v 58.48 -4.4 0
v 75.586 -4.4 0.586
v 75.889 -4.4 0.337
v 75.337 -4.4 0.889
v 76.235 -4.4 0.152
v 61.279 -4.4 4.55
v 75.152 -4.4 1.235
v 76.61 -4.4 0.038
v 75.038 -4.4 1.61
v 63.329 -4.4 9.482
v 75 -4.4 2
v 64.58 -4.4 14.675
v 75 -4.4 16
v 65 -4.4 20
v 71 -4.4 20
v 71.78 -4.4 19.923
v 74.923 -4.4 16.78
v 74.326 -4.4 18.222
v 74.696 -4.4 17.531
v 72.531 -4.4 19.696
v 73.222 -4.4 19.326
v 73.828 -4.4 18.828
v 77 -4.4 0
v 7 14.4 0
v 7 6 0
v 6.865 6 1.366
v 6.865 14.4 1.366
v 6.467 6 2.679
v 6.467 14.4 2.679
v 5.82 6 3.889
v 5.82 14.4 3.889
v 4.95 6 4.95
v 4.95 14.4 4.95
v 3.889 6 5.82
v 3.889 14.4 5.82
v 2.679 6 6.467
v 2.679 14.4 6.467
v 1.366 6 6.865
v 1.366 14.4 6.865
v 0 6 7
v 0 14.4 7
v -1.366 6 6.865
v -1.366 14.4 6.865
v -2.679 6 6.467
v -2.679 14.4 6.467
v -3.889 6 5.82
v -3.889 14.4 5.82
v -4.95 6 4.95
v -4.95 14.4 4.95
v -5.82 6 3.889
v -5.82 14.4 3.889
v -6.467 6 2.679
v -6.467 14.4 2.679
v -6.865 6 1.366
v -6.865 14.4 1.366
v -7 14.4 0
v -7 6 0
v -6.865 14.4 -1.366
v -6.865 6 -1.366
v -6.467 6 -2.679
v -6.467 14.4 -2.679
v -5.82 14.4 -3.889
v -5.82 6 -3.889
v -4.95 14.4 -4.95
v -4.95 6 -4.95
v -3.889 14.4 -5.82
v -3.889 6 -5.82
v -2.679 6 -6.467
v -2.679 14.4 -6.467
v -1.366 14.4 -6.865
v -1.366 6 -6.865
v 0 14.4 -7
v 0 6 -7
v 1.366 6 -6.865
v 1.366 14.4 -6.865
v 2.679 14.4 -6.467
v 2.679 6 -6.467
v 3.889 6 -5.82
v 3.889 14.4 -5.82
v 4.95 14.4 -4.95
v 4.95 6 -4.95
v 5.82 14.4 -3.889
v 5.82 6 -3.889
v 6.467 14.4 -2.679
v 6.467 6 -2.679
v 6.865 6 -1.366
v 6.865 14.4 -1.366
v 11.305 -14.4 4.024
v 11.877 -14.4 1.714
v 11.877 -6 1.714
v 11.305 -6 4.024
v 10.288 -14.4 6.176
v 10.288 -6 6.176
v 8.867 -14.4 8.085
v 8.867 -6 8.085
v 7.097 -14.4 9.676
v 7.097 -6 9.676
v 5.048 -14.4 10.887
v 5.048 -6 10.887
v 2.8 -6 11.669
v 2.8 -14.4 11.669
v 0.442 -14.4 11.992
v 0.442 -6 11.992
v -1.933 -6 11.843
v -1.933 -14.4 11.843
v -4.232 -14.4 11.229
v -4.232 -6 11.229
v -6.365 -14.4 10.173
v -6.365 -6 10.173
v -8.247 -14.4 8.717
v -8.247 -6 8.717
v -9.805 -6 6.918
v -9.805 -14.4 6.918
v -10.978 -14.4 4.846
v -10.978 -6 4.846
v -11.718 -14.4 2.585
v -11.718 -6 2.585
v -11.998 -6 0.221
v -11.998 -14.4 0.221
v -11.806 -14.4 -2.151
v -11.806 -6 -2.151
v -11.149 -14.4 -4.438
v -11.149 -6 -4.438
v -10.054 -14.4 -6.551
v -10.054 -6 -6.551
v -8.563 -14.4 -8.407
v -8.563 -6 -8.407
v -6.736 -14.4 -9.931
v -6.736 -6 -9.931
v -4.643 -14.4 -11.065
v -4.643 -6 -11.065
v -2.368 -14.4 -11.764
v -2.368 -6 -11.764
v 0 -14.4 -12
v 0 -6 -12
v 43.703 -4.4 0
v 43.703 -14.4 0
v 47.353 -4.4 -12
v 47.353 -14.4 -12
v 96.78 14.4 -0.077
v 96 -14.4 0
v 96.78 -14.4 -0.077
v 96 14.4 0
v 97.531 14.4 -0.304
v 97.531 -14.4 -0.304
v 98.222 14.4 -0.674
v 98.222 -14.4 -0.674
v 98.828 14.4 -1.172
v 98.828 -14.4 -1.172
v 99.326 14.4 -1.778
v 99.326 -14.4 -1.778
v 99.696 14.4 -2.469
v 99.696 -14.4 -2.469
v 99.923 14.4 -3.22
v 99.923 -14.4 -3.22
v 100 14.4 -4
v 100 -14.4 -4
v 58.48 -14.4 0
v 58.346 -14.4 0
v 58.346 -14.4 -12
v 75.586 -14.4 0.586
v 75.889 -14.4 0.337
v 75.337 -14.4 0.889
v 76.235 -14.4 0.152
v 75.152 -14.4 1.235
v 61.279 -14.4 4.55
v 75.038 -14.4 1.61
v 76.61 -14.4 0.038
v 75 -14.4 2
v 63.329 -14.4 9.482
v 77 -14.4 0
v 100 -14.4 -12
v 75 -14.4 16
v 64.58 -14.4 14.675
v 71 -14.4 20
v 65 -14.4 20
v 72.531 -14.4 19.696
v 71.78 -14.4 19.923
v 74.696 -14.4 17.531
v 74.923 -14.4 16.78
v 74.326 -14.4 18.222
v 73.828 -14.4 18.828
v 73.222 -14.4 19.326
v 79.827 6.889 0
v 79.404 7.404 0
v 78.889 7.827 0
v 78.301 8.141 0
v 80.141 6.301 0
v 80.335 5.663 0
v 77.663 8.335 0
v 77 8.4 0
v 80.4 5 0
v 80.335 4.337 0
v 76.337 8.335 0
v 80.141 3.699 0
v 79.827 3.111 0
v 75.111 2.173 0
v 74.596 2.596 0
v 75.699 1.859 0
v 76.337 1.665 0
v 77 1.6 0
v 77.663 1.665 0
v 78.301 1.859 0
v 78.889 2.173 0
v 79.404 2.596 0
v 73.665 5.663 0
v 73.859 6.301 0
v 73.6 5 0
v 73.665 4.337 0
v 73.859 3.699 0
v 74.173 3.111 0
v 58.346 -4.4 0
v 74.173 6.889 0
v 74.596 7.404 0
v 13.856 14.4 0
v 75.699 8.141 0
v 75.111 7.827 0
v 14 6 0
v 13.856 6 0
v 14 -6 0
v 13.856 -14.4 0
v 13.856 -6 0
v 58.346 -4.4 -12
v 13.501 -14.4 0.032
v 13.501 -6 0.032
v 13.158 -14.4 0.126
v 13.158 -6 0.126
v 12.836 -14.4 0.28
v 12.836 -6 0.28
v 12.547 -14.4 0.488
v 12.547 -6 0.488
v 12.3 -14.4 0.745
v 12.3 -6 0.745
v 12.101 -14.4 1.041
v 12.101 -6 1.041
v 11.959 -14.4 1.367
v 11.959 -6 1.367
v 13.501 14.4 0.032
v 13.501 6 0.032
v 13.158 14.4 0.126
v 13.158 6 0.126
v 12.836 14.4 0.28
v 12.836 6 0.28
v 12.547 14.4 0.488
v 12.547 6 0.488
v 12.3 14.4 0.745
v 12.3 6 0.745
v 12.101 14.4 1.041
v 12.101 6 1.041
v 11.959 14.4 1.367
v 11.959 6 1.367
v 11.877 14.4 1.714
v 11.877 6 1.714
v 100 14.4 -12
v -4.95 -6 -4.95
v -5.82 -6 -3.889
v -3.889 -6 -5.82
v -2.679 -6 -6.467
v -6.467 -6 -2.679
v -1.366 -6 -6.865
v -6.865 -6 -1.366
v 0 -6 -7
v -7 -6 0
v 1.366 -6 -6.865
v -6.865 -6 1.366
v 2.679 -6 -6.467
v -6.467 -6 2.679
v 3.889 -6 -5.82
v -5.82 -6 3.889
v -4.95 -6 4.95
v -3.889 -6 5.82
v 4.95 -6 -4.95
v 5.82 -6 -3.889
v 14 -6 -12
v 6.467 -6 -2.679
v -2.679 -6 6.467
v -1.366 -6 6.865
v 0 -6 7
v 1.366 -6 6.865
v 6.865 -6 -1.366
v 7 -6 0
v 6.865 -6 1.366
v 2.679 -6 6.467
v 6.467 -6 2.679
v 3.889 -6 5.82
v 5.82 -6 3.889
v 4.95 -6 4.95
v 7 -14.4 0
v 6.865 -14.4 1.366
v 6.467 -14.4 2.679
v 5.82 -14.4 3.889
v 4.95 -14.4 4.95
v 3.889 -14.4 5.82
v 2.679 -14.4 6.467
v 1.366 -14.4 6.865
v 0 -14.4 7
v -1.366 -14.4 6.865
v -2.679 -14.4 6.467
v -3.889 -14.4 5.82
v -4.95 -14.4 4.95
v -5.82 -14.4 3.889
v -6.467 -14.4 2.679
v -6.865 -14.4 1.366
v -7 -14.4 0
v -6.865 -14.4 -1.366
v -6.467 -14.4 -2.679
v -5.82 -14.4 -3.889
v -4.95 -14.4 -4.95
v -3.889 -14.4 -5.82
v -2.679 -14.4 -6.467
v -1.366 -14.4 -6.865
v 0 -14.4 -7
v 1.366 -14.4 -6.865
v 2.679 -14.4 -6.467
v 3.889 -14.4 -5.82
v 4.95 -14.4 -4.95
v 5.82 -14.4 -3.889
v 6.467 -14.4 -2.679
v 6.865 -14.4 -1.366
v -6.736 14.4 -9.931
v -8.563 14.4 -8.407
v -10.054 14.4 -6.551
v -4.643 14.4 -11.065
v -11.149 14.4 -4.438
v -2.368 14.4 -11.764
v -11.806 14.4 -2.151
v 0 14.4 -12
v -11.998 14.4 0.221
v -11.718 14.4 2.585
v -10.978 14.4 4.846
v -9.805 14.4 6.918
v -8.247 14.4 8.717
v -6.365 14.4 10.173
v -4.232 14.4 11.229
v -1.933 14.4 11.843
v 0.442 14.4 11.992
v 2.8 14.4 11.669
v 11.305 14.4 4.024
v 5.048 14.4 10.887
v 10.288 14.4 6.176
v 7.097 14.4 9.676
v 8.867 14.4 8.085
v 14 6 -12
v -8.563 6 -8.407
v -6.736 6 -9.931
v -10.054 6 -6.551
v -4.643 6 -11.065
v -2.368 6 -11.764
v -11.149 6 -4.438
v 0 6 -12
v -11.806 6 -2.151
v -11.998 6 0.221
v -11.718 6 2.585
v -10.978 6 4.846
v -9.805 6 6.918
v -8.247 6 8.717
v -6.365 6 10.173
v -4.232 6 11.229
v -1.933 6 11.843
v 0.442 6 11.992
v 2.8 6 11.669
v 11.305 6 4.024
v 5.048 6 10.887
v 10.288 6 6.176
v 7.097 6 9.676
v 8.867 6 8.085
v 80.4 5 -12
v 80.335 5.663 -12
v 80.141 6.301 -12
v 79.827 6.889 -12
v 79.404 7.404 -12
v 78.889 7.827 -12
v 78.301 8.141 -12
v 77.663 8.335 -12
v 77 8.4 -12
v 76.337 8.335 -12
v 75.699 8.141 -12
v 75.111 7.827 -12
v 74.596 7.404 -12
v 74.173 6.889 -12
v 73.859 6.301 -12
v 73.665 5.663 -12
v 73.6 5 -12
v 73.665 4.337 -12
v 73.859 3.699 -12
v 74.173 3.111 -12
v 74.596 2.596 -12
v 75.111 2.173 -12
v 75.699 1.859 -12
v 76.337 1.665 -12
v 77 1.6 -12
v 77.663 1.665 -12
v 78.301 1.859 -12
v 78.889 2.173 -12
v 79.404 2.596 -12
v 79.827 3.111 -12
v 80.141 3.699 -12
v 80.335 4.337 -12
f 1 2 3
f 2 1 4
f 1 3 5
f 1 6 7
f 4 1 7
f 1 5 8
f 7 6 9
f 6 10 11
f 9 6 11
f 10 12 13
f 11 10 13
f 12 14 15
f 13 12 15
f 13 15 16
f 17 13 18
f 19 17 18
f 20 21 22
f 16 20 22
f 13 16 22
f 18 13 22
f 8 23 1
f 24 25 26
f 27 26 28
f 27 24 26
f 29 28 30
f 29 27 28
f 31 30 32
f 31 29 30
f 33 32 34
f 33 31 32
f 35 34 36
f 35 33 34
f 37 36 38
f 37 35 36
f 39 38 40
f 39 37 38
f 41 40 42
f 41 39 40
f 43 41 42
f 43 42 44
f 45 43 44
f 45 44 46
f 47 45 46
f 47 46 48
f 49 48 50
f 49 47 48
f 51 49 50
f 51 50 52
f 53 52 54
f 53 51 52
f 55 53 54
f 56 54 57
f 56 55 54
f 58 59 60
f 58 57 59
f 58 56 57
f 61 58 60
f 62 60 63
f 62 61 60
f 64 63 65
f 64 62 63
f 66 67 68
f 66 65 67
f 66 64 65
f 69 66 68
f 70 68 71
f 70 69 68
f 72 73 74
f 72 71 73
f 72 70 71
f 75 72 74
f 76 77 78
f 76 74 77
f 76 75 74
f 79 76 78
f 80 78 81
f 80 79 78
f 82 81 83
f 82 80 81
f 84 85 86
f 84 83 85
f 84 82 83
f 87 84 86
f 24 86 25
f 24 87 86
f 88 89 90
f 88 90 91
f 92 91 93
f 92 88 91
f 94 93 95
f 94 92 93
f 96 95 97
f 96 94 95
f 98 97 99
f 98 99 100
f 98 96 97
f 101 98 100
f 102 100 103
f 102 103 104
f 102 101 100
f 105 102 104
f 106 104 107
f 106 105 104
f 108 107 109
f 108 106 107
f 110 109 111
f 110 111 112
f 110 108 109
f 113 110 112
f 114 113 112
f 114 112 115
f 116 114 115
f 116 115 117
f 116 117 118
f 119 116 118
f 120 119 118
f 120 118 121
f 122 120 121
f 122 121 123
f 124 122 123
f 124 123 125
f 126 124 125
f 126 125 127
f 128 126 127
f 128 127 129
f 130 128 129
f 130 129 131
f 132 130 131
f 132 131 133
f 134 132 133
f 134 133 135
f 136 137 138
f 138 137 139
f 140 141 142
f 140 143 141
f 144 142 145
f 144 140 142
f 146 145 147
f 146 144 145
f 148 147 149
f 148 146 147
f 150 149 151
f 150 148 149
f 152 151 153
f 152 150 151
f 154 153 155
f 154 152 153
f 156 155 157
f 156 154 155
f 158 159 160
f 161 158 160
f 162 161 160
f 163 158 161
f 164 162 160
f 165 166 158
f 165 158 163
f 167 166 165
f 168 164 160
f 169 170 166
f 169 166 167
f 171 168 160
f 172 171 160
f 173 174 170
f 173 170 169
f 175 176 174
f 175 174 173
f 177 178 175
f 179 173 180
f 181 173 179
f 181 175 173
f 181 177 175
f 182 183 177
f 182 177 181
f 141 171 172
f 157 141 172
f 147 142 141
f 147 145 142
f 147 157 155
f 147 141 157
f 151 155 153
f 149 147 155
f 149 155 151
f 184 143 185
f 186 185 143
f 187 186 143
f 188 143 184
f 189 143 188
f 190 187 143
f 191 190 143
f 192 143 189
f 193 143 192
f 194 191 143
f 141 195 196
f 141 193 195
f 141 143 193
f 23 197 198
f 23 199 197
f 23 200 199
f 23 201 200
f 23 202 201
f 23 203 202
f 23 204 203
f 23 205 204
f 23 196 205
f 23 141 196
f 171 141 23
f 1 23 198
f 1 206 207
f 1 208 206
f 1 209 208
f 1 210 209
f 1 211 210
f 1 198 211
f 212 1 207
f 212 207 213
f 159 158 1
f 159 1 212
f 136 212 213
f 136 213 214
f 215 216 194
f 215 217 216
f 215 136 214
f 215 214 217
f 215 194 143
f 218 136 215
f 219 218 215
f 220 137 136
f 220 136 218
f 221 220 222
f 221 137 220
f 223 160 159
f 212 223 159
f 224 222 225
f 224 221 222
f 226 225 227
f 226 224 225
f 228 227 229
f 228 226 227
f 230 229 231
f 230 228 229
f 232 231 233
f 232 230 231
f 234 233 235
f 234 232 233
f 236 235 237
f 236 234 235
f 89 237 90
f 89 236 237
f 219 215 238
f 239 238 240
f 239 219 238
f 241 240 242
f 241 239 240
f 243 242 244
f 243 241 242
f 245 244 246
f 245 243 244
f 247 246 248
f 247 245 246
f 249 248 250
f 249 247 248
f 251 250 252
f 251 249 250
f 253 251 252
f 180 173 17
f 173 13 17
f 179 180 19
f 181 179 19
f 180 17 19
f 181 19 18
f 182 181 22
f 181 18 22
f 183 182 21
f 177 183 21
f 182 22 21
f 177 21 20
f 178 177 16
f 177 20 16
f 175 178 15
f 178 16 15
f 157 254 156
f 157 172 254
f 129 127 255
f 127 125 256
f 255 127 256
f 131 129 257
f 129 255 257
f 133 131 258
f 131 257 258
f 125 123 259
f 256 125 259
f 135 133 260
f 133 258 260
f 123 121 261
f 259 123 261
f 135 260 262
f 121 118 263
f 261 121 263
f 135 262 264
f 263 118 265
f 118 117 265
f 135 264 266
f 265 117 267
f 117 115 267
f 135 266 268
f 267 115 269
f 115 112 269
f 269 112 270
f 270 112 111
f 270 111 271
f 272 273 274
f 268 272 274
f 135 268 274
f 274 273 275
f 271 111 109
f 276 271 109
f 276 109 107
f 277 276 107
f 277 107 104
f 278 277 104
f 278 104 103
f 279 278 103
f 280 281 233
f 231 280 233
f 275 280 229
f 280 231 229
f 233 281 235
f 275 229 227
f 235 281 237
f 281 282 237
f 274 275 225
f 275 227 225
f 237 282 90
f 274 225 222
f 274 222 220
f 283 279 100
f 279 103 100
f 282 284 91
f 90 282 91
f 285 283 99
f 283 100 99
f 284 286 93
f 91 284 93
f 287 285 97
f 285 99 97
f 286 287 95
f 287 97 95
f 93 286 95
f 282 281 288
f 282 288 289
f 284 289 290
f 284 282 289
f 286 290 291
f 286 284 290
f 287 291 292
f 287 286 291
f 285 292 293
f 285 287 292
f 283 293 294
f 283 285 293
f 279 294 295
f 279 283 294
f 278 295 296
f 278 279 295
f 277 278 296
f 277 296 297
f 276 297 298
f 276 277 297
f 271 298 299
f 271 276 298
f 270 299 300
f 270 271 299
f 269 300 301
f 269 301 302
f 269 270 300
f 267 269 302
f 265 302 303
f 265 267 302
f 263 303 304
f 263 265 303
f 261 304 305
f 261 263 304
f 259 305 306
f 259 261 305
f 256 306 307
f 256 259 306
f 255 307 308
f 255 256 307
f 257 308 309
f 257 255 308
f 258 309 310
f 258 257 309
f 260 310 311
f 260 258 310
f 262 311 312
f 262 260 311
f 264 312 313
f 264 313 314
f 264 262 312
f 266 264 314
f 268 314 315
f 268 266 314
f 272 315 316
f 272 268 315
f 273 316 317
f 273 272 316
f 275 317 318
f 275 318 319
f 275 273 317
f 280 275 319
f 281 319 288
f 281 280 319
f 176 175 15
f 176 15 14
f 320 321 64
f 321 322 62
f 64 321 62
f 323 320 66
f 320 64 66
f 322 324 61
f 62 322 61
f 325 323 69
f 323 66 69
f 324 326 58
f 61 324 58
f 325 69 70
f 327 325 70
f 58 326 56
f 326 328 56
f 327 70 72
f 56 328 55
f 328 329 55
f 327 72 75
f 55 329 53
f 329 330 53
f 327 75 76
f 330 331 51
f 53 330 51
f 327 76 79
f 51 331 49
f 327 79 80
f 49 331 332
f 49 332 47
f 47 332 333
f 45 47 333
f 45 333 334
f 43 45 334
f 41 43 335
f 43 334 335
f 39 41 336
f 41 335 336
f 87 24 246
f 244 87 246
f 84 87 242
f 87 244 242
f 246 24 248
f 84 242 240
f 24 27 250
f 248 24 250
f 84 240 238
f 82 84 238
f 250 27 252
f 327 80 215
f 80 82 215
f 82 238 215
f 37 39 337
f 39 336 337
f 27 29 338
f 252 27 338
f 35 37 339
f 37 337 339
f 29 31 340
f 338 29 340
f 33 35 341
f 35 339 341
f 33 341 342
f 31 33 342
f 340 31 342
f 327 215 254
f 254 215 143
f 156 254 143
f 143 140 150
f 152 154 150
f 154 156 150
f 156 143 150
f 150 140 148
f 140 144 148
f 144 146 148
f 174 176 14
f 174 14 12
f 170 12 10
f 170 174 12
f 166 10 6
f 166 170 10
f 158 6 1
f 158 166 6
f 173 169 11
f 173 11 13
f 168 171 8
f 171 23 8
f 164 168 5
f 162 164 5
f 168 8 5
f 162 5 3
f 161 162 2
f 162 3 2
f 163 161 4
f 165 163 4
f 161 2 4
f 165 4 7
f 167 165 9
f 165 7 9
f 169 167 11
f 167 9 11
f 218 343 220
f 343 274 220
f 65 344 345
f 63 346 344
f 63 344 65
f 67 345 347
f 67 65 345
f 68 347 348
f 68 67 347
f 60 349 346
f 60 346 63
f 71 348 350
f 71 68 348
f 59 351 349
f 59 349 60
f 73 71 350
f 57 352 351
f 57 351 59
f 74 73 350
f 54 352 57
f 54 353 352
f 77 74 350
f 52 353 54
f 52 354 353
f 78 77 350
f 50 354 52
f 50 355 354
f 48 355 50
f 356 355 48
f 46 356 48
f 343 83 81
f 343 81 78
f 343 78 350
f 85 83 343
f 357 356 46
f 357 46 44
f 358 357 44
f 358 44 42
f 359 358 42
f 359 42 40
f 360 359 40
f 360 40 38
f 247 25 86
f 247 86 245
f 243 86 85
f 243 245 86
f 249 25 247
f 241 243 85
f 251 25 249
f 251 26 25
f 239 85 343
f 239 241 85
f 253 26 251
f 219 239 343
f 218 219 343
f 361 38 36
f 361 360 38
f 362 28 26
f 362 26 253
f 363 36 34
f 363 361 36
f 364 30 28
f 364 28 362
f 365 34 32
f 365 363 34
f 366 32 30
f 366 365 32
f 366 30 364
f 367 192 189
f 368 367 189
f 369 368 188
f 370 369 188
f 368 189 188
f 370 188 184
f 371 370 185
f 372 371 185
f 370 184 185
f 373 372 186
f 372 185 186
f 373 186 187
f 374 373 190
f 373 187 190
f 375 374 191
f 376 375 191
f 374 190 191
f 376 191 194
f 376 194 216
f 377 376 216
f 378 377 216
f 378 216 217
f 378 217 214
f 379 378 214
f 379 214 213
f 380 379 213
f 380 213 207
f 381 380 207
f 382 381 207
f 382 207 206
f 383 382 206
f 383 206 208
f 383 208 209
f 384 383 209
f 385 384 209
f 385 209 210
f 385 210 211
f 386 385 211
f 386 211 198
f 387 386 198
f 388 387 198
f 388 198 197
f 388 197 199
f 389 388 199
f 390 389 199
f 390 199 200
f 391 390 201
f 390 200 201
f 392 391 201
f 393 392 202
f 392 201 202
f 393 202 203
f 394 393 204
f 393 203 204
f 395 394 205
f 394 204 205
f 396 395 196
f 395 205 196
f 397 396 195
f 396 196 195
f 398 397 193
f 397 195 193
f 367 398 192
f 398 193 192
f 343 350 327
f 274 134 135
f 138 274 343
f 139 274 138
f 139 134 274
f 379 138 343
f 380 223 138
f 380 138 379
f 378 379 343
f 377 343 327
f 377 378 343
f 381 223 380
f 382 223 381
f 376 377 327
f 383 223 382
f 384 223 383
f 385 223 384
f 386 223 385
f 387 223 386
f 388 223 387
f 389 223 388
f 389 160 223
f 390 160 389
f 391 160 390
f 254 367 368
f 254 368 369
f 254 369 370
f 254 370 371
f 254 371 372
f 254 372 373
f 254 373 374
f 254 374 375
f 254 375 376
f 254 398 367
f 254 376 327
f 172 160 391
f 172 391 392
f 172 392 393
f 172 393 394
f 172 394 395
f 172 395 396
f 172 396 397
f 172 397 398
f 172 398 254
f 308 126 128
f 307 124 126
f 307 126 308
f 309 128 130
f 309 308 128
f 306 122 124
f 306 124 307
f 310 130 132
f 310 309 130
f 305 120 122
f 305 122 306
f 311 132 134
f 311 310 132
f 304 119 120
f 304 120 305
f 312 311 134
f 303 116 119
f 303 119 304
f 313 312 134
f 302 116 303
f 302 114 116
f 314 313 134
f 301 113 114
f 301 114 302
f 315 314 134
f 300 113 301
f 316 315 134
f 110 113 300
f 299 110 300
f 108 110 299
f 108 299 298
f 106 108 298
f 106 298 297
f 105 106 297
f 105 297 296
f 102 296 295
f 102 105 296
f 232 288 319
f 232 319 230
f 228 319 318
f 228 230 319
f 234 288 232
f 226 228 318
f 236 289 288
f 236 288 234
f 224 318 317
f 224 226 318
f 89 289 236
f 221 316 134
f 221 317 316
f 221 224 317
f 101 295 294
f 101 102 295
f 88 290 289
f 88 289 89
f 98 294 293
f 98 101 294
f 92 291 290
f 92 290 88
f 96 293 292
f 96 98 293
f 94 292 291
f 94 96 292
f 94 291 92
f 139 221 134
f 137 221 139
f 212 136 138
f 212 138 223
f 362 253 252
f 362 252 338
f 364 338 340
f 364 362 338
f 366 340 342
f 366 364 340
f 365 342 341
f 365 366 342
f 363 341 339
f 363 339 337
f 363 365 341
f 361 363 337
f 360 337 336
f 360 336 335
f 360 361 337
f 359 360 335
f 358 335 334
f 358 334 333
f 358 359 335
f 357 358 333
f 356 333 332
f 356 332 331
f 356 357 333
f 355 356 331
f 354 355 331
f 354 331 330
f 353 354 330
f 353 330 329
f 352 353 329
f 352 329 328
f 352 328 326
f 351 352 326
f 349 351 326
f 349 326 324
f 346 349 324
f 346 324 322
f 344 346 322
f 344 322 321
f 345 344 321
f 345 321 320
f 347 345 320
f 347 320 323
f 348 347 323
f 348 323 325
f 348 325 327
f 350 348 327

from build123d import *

# Parameters (mm, degrees)
F0_R      = 7
F1_DEPTH  = 14.4
F4_DEPTH  = 10
F7_DEPTH  = 10
F8_DEPTH  = 6
F9_R      = 3.4
F10_DEPTH = 25
F11_R     = 4
F12_R     = 2


with BuildPart() as f1:
    # F0 (on Front) → F1 (new body, symmetric)
    with BuildSketch(Plane.XZ):
        with BuildLine():
            Line((100, 0), (12, 0))
            ThreePointArc((12, 0), (-8.4852813742, 8.4852813742), (0, -12))
            Line((0, -12), (100, -12))
            Line((100, -12), (100, 0))
        make_face()
        Circle(F0_R, mode=Mode.SUBTRACT)
    extrude(amount=F1_DEPTH, both=True)

    # F3 (on face) → F4 (join)
    with BuildSketch(Plane.XZ.offset(14.4)):
        with BuildLine():
            Line((65, 0), (75, 0))
            Line((75, 0), (75, 20))
            Line((75, 20), (65, 20))
            ThreePointArc((65, 20), (63.3288514808, 9.4820344172), (58.48, 0))
            Line((58.48, 0), (65, 0))
        make_face()
    extrude(amount=-F4_DEPTH)

    # F6 (on face) → F7 (cut)
    with BuildSketch(Plane.XZ.offset(14.4)):
        Polygon((58.3458282053, -12), (58.3458282053, 0), (43.7034219503, 0), (47.3529601204, -12), align=None)
    extrude(amount=-F7_DEPTH, mode=Mode.SUBTRACT)

    # F2 (on Front) → F8 (cut, symmetric)
    with BuildSketch(Plane.XZ):
        with BuildLine():
            Line((14, -12), (14, 0))
            Line((14, 0), (12, 0))
            ThreePointArc((12, 0), (-8.4852813742, 8.4852813742), (0, -12))
            Line((0, -12), (14, -12))
        make_face()
    extrude(amount=F8_DEPTH, both=True, mode=Mode.SUBTRACT)

    # F9 (on face) → F10 (cut)
    with BuildSketch(Plane.XY):
        with Locations((77, 5)):
            Circle(F9_R)
    extrude(amount=-F10_DEPTH, mode=Mode.SUBTRACT)

    # F11
    f11_edges = [f1.edges().sort_by_distance(p)[0] for p in [
        (100, 0, 0),
        (75, -9.4, 20),
    ]]
    fillet(f11_edges, radius=F11_R)

    # F12
    f12_edges = [f1.edges().sort_by_distance(p)[0] for p in [
        (75, -9.4, 0),
        (12, 10.2, 0),
        (12, -10.2, 0),
    ]]
    fillet(f12_edges, radius=F12_R)


solid = f1.part
